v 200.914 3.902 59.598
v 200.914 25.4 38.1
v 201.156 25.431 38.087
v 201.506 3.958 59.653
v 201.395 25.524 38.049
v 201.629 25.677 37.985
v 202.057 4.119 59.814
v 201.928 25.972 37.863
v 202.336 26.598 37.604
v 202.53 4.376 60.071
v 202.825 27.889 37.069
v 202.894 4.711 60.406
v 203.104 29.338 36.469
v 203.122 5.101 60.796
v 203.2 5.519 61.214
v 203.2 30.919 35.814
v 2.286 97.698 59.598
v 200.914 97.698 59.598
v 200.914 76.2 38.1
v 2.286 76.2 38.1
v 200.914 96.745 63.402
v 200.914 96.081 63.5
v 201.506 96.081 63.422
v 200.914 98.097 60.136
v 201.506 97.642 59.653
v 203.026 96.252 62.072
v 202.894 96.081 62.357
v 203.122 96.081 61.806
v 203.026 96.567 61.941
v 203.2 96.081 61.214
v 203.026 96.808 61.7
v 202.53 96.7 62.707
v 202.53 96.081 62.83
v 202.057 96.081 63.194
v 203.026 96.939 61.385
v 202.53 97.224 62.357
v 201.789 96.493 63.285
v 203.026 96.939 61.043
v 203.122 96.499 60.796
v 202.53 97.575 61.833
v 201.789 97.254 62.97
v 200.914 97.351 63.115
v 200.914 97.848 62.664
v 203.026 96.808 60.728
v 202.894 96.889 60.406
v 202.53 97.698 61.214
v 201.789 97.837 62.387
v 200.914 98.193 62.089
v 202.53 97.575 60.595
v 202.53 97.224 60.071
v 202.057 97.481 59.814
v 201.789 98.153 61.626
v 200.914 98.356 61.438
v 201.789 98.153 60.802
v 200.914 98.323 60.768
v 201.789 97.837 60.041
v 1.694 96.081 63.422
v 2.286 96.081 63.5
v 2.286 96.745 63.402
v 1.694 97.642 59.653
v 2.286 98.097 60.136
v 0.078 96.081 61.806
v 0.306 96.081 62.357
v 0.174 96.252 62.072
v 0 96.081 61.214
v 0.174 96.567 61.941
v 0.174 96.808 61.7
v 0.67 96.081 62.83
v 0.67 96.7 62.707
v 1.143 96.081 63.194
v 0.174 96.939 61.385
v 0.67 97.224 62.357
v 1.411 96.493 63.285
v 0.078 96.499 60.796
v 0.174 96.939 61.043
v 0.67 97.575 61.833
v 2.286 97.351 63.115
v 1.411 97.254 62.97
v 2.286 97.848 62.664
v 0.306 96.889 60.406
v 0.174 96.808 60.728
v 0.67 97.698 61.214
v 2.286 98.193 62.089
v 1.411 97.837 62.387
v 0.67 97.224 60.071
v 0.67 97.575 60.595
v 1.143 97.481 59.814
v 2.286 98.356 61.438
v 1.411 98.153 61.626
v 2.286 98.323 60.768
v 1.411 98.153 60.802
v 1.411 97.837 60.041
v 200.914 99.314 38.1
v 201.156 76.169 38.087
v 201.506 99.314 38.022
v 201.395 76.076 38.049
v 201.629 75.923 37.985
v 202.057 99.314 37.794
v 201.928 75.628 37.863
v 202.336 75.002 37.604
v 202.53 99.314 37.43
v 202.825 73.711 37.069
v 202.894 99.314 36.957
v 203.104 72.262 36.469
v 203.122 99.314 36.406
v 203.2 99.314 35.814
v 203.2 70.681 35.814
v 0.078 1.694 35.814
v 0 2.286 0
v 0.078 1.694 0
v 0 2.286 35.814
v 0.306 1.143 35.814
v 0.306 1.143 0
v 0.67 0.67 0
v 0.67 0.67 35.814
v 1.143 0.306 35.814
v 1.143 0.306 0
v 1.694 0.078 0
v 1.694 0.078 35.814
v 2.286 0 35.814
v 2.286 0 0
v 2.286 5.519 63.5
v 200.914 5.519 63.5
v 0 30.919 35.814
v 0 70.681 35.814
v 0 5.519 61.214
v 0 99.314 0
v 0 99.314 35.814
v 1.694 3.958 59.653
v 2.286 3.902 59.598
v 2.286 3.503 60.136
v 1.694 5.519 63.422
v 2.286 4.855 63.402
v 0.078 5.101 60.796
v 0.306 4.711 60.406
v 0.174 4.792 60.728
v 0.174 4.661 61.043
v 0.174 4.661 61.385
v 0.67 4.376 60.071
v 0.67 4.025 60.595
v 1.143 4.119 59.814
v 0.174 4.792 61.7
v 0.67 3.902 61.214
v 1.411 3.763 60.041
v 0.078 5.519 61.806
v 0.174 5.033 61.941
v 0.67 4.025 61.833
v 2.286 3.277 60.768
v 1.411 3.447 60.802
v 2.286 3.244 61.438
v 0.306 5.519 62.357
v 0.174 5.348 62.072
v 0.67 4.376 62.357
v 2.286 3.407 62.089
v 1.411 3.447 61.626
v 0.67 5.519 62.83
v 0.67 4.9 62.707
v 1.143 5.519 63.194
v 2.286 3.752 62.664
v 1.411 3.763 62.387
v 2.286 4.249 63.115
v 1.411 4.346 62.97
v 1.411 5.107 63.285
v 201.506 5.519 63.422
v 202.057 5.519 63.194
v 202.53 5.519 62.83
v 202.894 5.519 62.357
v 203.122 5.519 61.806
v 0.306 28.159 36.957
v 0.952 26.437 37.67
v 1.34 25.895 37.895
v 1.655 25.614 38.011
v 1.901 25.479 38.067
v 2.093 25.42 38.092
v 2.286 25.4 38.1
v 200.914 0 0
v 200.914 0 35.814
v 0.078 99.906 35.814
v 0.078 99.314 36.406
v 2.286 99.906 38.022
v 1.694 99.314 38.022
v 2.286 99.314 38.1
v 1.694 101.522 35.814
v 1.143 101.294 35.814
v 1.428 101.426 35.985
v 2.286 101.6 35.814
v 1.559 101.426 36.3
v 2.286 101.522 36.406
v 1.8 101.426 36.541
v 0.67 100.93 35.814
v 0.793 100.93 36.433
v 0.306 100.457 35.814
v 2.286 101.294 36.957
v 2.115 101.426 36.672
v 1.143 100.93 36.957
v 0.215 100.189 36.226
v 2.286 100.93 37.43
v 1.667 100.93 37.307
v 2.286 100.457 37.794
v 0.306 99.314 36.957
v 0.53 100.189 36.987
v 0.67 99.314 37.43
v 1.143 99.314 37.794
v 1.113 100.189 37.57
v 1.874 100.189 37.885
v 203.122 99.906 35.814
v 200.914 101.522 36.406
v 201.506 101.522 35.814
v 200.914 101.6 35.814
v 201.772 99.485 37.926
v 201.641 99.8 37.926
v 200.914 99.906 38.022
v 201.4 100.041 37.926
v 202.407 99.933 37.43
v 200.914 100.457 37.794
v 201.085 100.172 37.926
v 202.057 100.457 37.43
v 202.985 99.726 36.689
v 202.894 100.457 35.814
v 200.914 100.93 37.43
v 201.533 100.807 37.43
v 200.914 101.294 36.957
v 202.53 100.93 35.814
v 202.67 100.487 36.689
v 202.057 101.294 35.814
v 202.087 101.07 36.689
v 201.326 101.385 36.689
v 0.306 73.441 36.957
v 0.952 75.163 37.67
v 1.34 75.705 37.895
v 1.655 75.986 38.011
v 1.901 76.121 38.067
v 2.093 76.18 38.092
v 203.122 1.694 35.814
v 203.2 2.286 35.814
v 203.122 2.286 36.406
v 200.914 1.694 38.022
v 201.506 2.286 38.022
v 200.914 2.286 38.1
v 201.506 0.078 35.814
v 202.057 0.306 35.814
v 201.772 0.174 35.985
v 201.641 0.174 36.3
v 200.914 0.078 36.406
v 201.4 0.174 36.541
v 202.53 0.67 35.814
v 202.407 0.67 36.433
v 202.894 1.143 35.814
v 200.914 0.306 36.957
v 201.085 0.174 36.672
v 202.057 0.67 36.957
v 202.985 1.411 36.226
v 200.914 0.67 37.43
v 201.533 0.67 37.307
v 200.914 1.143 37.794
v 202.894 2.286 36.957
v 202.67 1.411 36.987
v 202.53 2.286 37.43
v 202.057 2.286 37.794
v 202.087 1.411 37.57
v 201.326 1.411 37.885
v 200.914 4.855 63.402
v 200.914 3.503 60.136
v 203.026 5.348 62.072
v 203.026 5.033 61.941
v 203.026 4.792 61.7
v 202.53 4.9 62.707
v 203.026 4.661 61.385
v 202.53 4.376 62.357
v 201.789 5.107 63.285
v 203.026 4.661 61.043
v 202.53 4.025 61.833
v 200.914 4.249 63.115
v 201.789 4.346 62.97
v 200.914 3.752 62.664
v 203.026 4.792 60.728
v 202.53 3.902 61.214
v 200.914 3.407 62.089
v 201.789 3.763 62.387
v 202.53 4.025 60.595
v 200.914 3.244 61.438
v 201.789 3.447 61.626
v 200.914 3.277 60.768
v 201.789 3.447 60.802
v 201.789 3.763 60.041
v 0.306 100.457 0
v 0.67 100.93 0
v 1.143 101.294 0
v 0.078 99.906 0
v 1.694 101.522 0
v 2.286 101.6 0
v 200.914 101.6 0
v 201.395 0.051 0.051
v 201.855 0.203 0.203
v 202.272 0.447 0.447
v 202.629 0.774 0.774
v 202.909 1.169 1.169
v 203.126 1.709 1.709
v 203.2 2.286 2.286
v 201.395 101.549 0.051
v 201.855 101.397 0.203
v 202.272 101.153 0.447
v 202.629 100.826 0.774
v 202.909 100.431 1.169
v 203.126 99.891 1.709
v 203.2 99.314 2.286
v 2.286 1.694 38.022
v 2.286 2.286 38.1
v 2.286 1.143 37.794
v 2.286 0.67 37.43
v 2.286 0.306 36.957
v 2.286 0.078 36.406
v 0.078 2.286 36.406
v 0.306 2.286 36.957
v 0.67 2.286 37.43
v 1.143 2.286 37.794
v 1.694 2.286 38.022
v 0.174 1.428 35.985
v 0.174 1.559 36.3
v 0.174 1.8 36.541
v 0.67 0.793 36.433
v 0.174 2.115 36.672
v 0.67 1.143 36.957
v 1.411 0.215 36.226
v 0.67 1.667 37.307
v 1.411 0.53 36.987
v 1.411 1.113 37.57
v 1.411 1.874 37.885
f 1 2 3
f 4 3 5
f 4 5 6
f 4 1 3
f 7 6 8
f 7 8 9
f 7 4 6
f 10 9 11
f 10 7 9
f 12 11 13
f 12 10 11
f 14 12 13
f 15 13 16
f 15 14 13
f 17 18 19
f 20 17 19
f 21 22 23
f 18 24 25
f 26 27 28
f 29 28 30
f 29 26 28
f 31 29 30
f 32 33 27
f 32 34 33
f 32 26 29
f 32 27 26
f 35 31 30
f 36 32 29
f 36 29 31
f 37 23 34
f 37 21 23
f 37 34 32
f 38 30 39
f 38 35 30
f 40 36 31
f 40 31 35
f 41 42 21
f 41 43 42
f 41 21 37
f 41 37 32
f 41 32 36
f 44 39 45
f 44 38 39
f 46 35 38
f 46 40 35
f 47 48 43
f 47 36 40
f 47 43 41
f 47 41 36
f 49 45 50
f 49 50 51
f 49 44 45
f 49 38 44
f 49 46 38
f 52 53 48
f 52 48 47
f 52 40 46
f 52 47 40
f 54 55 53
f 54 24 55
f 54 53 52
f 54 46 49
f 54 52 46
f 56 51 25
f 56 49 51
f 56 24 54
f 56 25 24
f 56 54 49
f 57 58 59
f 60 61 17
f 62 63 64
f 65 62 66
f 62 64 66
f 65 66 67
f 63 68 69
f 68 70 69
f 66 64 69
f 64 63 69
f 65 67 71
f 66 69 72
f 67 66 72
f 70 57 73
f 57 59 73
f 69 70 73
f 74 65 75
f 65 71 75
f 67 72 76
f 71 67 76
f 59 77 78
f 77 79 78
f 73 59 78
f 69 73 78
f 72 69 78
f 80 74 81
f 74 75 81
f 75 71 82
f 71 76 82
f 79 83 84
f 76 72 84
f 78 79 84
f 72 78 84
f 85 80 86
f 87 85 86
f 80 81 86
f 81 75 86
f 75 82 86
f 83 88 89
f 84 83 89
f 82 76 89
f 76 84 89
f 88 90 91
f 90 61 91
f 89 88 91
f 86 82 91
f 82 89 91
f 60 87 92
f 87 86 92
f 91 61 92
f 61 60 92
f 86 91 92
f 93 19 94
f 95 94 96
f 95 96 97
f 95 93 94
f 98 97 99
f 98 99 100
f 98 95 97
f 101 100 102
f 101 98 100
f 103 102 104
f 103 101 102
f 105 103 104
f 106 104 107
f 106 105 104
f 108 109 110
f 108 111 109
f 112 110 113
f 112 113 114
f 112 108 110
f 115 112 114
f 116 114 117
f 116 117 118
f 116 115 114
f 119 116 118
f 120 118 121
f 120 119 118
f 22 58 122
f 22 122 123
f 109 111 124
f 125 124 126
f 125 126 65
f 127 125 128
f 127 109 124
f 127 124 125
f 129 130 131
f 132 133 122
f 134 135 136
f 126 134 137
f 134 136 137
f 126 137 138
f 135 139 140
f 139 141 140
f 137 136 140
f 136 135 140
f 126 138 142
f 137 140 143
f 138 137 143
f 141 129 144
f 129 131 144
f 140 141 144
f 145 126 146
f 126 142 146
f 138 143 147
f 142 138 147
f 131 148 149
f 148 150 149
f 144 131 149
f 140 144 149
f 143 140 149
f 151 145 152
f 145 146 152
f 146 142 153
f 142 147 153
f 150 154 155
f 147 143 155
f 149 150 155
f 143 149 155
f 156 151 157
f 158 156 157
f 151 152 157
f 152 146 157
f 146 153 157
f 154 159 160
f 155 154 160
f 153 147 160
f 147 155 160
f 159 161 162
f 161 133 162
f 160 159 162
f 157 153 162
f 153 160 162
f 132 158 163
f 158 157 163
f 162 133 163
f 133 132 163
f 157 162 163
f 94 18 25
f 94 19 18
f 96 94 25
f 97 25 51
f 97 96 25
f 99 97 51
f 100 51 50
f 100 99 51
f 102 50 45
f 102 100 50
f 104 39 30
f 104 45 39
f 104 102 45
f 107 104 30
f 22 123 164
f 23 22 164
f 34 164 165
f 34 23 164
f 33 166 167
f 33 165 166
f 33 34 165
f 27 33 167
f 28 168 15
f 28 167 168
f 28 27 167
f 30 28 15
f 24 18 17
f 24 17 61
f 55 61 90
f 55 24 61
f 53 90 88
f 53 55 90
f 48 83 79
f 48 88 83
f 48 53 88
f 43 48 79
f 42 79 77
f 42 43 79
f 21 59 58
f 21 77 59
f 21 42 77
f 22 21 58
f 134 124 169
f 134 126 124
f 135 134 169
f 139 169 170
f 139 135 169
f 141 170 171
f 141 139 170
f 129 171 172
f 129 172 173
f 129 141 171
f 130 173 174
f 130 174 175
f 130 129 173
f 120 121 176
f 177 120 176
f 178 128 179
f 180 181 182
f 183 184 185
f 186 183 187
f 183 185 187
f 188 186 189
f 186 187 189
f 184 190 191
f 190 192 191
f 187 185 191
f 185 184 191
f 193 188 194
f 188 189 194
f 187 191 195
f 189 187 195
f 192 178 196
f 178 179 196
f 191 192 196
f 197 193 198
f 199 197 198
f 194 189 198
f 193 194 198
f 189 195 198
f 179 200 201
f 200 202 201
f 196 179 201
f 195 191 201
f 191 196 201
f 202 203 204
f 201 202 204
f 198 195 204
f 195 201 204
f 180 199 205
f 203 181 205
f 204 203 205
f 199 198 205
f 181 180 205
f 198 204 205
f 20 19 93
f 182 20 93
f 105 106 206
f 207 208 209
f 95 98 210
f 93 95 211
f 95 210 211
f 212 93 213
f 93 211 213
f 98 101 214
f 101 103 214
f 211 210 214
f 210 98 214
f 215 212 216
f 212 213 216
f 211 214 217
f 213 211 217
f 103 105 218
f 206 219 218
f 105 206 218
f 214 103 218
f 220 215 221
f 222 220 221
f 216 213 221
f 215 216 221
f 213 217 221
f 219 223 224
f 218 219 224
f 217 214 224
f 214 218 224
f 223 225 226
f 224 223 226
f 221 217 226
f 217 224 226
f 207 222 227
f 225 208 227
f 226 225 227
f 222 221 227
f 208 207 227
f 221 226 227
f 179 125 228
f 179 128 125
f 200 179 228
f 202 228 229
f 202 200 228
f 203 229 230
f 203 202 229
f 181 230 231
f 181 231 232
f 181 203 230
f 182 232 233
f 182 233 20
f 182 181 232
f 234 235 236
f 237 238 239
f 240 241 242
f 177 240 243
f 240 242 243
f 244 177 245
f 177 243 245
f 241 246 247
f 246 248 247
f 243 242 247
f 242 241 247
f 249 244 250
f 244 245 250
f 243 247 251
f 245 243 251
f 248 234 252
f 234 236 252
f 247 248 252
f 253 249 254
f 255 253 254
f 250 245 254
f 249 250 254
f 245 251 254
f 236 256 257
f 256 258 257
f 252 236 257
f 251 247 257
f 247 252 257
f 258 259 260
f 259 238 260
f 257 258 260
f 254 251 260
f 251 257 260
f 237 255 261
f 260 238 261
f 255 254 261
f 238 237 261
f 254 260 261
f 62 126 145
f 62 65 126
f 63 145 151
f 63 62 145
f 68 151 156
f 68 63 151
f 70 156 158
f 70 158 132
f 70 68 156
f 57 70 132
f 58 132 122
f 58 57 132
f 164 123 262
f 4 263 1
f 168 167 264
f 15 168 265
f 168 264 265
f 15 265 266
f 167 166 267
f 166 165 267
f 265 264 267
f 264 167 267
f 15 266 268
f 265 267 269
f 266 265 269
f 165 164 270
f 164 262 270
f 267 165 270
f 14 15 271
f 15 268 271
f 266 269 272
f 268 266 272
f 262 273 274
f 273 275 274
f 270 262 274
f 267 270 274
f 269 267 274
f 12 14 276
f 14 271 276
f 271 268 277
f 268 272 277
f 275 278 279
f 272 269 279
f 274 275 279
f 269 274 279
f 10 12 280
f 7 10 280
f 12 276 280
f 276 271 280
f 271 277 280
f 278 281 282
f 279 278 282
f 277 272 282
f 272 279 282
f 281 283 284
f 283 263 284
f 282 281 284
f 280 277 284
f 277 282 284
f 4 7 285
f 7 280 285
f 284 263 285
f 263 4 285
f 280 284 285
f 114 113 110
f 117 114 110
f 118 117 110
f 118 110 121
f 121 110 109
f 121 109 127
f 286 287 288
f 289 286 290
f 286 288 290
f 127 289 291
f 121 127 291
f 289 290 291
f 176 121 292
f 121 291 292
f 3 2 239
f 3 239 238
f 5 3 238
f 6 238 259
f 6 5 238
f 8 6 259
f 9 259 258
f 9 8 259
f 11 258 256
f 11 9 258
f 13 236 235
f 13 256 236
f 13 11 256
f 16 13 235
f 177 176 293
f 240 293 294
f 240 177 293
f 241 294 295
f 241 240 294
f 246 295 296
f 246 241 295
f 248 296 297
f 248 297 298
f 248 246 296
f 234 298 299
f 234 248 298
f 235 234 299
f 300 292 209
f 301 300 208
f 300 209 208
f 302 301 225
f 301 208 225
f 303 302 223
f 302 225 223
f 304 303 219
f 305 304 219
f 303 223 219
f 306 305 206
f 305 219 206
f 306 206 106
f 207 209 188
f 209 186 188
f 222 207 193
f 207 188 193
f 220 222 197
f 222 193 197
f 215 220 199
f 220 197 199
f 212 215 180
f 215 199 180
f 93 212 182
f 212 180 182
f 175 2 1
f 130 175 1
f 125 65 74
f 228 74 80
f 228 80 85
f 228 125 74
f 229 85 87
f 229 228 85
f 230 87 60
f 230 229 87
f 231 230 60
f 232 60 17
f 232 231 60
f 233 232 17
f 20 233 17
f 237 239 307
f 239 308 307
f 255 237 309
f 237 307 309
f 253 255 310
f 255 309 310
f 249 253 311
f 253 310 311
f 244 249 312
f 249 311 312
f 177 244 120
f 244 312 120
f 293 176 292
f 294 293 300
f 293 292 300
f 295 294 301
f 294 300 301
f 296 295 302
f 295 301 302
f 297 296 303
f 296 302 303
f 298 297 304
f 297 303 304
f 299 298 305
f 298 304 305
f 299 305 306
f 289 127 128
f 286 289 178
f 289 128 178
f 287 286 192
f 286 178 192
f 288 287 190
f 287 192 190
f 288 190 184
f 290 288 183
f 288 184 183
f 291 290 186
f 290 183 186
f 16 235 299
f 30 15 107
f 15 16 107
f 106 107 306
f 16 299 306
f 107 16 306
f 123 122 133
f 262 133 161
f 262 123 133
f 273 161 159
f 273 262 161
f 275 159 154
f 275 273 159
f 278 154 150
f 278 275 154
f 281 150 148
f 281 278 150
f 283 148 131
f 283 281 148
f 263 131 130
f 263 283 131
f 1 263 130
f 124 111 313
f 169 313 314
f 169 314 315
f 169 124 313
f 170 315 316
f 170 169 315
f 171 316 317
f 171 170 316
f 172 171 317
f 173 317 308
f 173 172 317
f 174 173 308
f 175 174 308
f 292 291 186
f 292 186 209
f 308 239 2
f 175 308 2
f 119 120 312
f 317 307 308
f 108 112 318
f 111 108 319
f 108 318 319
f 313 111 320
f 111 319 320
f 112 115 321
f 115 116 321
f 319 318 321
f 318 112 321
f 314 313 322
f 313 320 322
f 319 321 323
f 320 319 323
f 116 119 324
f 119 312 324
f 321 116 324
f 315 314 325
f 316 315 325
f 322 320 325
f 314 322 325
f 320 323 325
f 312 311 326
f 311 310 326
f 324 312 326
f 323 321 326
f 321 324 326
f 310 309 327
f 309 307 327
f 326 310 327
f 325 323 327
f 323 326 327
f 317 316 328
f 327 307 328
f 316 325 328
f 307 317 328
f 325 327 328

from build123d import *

# Parameters (mm, degrees)
F0_W     = 203.2
F0_H     = 101.6
F1_DEPTH = 63.5
F3_DEPTH = 203.2
F4_R     = 2.286


with BuildPart() as f1:
    # F0 (on Top) → F1 (new body)
    with BuildSketch(Plane.XY):
        with Locations((101.6, 50.8)):
            Rectangle(F0_W, F0_H)
    extrude(amount=F1_DEPTH)

    # F2 (on face) → F3 (cut, through all)
    with BuildSketch(Plane.YZ.offset(203.2)):
        Polygon((25.4, 38.1), (0, 63.5), (0, 38.1), align=None)
        Polygon((101.6, 38.1), (101.6, 63.5), (76.2, 38.1), align=None)
    extrude(amount=-F3_DEPTH, mode=Mode.SUBTRACT)

    # F4
    f4_edges = [f1.edges().sort_by_distance(p)[0] for p in [
        (203.2, 50.8, 63.5),
        (203.2, 12.7, 50.8),
        (203.2, 12.7, 38.1),
        (203.2, 0, 19.05),
        (203.2, 50.8, 0),
        (203.2, 101.6, 19.05),
        (203.2, 88.9, 38.1),
        (203.2, 88.9, 50.8),
        (101.6, 0, 38.1),
        (101.6, 0, 63.5),
        (0, 0, 19.05),
        (0, 12.7, 38.1),
        (0, 12.7, 50.8),
        (0, 50.8, 63.5),
        (0, 88.9, 50.8),
        (0, 88.9, 38.1),
        (0, 101.6, 19.05),
        (101.6, 101.6, 38.1),
        (101.6, 101.6, 63.5),
    ]]
    fillet(f4_edges, radius=F4_R)


solid = f1.part
